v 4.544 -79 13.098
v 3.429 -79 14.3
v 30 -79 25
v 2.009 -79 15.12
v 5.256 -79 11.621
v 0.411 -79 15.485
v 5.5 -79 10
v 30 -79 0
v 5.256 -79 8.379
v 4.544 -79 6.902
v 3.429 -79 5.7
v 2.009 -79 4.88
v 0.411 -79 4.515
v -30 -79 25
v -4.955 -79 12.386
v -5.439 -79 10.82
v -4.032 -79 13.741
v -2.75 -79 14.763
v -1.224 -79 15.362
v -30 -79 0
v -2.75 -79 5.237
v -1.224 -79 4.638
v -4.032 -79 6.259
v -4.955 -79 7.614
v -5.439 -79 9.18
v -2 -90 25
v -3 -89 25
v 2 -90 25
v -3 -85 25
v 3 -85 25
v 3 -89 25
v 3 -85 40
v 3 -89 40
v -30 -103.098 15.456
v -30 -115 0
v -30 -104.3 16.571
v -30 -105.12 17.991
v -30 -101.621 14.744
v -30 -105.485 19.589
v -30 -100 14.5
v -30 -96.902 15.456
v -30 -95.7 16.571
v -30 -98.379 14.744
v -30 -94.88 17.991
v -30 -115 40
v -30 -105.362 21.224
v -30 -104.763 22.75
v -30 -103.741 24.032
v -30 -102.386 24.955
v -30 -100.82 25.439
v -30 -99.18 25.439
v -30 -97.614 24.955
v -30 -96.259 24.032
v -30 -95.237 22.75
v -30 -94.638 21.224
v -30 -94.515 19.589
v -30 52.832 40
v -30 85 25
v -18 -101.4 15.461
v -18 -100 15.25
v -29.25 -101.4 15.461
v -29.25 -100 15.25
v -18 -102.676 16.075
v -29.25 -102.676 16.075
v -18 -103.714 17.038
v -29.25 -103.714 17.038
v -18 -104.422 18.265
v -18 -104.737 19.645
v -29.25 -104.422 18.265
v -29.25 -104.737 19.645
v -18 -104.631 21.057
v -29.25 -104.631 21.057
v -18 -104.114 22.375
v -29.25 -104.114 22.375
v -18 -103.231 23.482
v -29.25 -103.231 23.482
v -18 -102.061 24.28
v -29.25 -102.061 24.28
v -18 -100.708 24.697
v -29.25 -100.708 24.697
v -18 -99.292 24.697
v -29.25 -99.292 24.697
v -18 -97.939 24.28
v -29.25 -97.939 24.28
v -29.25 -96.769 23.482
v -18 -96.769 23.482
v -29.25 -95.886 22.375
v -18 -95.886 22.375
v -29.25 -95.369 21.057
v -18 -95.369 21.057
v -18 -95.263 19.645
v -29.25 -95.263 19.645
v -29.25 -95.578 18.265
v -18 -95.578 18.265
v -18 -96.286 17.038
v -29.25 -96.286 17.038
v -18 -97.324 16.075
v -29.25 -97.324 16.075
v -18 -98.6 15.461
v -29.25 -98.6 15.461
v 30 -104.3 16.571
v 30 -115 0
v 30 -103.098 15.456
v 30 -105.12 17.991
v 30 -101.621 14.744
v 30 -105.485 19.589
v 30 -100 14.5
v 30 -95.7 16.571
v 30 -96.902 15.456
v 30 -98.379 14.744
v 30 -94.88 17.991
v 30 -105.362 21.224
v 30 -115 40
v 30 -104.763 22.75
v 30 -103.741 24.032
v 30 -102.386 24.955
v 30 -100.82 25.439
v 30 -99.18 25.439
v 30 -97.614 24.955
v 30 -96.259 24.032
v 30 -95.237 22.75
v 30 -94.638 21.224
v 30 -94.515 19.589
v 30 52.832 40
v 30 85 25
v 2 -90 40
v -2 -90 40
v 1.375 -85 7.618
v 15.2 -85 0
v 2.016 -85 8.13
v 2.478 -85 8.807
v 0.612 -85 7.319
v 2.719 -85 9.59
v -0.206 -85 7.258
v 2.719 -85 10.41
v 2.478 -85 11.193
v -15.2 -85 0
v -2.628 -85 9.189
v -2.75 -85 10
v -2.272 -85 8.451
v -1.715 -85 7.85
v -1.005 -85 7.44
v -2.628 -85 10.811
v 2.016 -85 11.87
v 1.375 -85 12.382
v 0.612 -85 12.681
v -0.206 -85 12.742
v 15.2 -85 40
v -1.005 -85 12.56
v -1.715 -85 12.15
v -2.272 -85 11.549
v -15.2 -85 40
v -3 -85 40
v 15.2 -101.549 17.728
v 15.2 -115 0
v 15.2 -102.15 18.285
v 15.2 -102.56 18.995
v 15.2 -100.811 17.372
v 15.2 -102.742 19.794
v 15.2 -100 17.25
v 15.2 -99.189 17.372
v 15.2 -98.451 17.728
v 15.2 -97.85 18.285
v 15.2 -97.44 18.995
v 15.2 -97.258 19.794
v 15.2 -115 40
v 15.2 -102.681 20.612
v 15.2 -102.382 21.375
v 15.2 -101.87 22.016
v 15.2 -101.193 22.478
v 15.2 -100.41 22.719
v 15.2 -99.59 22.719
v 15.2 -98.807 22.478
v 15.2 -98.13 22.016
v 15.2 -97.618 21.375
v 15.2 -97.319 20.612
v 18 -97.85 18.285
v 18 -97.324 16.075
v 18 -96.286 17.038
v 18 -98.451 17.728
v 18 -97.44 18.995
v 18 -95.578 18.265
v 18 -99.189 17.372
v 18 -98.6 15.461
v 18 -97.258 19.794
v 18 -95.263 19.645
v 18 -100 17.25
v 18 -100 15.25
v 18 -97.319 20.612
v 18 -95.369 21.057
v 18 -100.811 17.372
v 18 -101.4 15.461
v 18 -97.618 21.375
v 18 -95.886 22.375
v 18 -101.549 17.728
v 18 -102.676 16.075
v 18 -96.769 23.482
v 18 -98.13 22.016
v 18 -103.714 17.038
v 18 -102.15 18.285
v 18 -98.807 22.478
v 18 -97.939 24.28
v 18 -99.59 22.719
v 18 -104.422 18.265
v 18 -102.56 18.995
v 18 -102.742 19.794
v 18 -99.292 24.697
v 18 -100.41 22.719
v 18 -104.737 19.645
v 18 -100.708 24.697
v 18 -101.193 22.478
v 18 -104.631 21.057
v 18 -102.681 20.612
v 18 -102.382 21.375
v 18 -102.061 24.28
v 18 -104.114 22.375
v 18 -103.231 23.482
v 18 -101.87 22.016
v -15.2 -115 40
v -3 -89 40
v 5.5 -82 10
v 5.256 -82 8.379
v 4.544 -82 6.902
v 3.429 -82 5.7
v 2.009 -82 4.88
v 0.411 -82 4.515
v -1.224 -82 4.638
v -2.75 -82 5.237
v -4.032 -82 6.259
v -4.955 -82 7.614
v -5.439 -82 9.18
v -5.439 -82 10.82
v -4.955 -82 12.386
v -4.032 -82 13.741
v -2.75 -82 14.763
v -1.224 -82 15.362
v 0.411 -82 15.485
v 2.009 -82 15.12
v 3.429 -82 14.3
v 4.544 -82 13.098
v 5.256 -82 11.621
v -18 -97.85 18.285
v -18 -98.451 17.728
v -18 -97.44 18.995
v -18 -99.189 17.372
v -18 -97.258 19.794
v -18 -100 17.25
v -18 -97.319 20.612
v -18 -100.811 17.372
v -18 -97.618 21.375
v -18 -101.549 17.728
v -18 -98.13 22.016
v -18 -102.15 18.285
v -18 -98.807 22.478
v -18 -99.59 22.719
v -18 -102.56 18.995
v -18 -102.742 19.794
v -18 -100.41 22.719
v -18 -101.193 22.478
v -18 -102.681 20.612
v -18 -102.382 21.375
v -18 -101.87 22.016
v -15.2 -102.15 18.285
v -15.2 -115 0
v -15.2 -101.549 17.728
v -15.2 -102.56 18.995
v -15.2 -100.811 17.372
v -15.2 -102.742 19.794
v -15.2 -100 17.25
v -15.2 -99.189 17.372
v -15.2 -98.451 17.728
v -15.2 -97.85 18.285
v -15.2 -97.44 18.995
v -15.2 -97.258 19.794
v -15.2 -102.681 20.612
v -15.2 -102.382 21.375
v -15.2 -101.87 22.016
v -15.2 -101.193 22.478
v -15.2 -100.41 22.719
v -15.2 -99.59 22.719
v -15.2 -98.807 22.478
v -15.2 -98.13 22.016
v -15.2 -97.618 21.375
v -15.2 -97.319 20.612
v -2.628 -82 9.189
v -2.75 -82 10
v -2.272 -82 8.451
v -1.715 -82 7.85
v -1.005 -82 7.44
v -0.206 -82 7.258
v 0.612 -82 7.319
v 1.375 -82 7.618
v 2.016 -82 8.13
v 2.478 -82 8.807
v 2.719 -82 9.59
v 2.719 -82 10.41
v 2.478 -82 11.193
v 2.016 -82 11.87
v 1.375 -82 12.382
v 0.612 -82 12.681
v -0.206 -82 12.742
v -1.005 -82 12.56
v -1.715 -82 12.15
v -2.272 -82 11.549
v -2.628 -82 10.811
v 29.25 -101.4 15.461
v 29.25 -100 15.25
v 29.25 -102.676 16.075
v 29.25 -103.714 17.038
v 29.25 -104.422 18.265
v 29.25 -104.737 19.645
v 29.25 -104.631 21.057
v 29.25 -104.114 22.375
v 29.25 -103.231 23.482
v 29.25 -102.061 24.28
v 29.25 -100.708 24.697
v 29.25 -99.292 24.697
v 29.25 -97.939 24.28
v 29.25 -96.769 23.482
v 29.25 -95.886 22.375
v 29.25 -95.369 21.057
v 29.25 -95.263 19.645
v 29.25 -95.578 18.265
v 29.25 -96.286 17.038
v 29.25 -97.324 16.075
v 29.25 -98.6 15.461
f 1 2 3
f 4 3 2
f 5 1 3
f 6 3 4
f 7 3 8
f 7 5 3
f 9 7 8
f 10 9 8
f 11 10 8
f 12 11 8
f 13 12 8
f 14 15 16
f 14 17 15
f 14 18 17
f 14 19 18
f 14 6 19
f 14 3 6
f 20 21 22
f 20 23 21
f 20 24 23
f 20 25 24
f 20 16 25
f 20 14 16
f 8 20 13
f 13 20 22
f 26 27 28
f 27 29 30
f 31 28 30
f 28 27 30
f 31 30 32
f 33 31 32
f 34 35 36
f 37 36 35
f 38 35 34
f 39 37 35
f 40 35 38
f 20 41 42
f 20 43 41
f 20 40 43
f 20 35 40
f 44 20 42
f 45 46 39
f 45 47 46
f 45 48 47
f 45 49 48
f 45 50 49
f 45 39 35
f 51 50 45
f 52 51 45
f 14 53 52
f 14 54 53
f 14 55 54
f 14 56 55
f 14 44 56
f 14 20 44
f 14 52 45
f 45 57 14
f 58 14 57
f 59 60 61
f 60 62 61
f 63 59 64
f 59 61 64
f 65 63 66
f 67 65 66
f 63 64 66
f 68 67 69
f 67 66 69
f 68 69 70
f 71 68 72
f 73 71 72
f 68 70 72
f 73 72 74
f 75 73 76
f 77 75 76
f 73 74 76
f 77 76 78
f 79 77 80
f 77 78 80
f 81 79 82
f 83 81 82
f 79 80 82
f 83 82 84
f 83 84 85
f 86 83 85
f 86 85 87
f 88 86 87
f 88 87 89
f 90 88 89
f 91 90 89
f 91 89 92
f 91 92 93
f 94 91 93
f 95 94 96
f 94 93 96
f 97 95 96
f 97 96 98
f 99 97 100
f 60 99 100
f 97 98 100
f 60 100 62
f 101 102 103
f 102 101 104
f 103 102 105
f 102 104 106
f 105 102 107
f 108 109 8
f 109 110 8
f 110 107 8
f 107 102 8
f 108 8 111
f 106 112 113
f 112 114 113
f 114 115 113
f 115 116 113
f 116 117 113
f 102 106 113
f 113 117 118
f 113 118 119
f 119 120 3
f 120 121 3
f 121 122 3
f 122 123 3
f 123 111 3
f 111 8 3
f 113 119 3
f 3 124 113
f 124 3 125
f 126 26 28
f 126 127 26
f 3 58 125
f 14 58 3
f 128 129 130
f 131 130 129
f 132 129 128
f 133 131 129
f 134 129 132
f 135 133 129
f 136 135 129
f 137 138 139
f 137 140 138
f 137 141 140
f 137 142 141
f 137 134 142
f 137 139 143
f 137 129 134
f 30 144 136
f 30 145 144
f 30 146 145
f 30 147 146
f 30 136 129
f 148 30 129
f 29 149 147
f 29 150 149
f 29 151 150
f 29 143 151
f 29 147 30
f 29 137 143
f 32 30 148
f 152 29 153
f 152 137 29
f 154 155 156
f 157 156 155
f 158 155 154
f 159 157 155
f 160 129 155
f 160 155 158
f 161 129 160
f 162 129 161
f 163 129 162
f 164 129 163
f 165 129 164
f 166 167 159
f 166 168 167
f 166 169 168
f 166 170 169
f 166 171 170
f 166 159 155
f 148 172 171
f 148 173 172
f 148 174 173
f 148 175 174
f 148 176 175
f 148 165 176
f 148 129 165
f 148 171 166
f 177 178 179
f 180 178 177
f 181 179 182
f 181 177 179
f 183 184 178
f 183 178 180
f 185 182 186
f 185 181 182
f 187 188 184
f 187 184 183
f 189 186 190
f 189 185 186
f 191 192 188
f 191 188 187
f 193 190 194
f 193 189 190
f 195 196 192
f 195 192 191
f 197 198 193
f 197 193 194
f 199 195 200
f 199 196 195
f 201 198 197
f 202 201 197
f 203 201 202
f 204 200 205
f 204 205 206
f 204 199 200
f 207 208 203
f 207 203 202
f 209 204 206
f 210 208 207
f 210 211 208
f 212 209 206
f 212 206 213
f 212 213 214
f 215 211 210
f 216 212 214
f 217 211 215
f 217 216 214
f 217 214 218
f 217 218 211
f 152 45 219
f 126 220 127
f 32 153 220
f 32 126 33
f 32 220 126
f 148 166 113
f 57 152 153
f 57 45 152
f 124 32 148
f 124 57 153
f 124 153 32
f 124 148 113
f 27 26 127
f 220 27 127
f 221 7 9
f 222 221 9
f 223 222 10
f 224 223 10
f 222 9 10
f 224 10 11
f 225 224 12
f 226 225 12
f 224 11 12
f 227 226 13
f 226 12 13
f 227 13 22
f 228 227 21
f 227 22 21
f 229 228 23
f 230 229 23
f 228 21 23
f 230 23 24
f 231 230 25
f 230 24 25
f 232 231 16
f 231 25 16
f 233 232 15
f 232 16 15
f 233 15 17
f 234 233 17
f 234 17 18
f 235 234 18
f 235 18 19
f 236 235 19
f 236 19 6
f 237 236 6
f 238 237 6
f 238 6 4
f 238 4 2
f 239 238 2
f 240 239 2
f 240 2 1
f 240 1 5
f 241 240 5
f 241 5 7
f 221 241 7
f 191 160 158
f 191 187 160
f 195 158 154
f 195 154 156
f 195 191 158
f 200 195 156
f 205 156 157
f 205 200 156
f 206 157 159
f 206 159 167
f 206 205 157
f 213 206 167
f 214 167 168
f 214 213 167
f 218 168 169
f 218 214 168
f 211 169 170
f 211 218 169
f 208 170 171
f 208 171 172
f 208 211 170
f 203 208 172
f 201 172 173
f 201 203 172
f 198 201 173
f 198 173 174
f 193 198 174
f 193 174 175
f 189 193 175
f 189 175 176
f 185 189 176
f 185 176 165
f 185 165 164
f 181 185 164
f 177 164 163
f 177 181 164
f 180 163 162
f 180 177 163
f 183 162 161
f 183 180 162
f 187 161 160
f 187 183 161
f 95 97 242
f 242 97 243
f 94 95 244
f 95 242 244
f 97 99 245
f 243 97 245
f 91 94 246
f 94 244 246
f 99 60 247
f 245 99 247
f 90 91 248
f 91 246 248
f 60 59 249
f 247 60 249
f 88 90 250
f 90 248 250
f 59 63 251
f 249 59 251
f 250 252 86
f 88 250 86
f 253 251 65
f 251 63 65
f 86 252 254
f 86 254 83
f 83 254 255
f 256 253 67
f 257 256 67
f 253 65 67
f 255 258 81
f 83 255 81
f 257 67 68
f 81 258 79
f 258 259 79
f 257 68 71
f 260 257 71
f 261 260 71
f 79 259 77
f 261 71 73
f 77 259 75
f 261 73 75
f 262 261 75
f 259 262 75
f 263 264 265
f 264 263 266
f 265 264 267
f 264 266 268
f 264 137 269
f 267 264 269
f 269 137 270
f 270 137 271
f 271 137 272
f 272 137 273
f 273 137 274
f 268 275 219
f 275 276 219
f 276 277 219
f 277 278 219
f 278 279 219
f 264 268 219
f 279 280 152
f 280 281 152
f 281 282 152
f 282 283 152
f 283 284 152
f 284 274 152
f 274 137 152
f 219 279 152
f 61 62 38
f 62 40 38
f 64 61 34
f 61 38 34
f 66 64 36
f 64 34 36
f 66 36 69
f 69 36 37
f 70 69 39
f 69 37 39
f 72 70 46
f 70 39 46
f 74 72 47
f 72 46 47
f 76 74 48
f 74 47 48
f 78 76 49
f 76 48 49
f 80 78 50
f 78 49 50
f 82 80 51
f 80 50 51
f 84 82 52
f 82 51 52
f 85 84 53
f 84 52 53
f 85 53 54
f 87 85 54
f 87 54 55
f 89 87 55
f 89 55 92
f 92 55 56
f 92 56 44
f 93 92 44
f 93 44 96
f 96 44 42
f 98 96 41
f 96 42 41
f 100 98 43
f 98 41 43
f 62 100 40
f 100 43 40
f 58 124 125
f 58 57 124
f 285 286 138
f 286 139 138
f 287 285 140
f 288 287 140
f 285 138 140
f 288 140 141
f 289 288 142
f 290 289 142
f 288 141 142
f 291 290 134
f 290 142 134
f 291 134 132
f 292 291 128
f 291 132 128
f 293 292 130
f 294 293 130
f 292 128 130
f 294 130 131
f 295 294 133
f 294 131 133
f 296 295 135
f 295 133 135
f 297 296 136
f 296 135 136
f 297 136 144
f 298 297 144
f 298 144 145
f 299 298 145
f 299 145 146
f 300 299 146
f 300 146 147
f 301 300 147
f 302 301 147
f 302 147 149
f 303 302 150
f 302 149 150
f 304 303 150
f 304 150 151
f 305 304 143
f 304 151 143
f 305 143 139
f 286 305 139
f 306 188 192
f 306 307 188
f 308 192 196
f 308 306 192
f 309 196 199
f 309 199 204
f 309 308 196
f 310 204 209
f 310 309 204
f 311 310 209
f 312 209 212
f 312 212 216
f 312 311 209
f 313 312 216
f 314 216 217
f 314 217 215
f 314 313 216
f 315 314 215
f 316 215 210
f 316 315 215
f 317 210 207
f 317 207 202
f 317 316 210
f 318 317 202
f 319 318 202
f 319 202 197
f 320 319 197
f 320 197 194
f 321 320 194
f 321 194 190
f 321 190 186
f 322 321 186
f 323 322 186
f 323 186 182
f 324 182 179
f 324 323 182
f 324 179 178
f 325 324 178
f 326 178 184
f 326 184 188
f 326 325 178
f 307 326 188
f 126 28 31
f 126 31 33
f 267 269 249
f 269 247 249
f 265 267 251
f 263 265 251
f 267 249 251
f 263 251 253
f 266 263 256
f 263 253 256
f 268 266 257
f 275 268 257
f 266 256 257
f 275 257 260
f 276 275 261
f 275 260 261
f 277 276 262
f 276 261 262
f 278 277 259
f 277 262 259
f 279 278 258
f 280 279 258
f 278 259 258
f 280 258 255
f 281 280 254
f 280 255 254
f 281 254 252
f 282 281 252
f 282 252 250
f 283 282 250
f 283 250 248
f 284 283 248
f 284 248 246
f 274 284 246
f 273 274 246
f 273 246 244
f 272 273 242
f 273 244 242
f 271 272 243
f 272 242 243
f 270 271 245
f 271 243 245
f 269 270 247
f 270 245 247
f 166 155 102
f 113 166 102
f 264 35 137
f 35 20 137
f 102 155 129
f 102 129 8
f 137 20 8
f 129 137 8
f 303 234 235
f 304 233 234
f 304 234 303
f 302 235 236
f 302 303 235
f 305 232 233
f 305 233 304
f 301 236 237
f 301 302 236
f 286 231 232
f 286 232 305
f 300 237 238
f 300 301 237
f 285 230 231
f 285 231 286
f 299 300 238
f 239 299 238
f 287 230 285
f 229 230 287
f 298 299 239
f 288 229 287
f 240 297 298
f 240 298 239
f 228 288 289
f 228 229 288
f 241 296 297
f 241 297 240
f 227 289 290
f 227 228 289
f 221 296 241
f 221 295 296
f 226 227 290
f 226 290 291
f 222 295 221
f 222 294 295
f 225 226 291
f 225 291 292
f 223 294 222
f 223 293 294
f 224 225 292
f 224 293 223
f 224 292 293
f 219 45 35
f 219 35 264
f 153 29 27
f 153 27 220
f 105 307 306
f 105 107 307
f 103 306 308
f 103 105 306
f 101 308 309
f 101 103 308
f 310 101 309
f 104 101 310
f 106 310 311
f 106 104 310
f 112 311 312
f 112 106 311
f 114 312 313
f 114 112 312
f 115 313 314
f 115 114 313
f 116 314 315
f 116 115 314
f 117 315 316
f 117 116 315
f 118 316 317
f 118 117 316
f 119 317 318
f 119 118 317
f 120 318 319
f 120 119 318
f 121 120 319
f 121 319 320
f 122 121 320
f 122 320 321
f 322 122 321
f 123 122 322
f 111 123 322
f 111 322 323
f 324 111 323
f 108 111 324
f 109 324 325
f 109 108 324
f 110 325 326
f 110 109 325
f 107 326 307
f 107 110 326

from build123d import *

# Parameters (mm, degrees)
SKETCH_1_W                   = 30
SKETCH_1_H                   = 170
EXTRUDE_1_DEPTH              = 40
CUT_EXTRUDE_1_DEPTH          = 99.615414617
SKETCH_4_W                   = 25
SKETCH_4_H                   = 164
CUT_EXTRUDE_2_DEPTH          = 99.615414617
HOLE_WIZARD_M5_2_D           = 5.5
HOLE_WIZARD_M5_2_CBORE_D     = 11
HOLE_WIZARD_M5_2_CBORE_DEPTH = 3
SKETCH_9_W                   = 6
SKETCH_9_H                   = 15
EXTRUDE_2_DEPTH              = 5
CHAMFER_1_SIZE               = 1
EXTRUDE_3_DEPTH              = 15
SKETCH_11_W                  = 14.8
SKETCH_11_H                  = 40
EXTRUDE_4_DEPTH              = 30


with BuildPart() as part:
    # 스케치1 → 보스-돌출1 (new body)
    with BuildSketch(Plane.XY):
        Rectangle(SKETCH_1_W, SKETCH_1_H)
    extrude(amount=EXTRUDE_1_DEPTH)

    # 스케치3 → 컷-돌출1 (cut, through all)
    with BuildSketch(Plane(origin=(15, 0, 0), x_dir=(0, 0, -1), z_dir=(1, 0, 0))):
        Polygon((-40, 85), (-40, 52.832396192), (-25, 85), align=None)
    extrude(amount=-CUT_EXTRUDE_1_DEPTH, mode=Mode.SUBTRACT)

    # 스케치4 → 컷-돌출2 (cut, through all)
    with BuildSketch(Plane.ZY.offset(15)):
        with Locations((12.5, 3)):
            Rectangle(SKETCH_4_W, SKETCH_4_H)
    extrude(amount=-CUT_EXTRUDE_2_DEPTH, mode=Mode.SUBTRACT)

    # M5 소켓 머리 캡 나사용 카운터보어2 (through all)
    with Locations(Plane(origin=(0, -79, 0), x_dir=(1, 0, 0), z_dir=(0, 1, 0))):
        with Locations((0, -10)):
            CounterBoreHole(HOLE_WIZARD_M5_2_D / 2, HOLE_WIZARD_M5_2_CBORE_D / 2, HOLE_WIZARD_M5_2_CBORE_DEPTH)

    # 스케치9 → 보스-돌출2 (add)
    with BuildSketch(Plane.XZ.offset(85)):
        with Locations((0, 32.5)):
            Rectangle(SKETCH_9_W, SKETCH_9_H)
    extrude(amount=EXTRUDE_2_DEPTH)

    # 모따기1
    chamfer_1_edges = [part.edges().sort_by_distance(p)[0] for p in [
        (3, -90, 32.5),
        (-3, -90, 32.5),
    ]]
    chamfer(chamfer_1_edges, length=CHAMFER_1_SIZE)

    # 스케치10 → 보스-돌출3 (add)
    with BuildSketch(Plane.ZY.offset(15)):
        Polygon((25, -79), (0, -79), (0, -85), (40, -85), (40, 52.832396192), (25, 85), align=None)
    extrude_3 = extrude(amount=EXTRUDE_3_DEPTH)

    # 대칭 복사1: 보스-돌출3 across plane
    add(extrude_3.mirror(Plane.ZY))

    # 스케치11 → 보스-돌출4 (add)
    with BuildSketch(Plane.XZ.offset(85)):
        with Locations((-22.6, 20)):
            Rectangle(SKETCH_11_W, SKETCH_11_H)
        with Locations((22.6, 20)):
            Rectangle(SKETCH_11_W, SKETCH_11_H)
    extrude(amount=EXTRUDE_4_DEPTH)

    # 스케치14 → M5 소켓 머리 캡 나사용 카운터보어1 (revolve, cut)
    with BuildSketch(Plane(origin=(30, -100, 20), x_dir=(0, 0, -1), z_dir=(0, 1, 0))):
        Polygon((0, 0), (0, 14.8), (2.75, 14.8), (2.75, 12), (4.75, 12), (4.75, 0.75), (5.5, 0), align=None)
    hole_wizard_m5_1 = revolve(axis=Axis((36.35, -100, 20), (-1, 0, 0)), mode=Mode.SUBTRACT)

    # 대칭 복사2: M5 소켓 머리 캡 나사용 카운터보어1 across plane
    add(hole_wizard_m5_1.mirror(Plane.ZY), mode=Mode.SUBTRACT)


solid = part.part
